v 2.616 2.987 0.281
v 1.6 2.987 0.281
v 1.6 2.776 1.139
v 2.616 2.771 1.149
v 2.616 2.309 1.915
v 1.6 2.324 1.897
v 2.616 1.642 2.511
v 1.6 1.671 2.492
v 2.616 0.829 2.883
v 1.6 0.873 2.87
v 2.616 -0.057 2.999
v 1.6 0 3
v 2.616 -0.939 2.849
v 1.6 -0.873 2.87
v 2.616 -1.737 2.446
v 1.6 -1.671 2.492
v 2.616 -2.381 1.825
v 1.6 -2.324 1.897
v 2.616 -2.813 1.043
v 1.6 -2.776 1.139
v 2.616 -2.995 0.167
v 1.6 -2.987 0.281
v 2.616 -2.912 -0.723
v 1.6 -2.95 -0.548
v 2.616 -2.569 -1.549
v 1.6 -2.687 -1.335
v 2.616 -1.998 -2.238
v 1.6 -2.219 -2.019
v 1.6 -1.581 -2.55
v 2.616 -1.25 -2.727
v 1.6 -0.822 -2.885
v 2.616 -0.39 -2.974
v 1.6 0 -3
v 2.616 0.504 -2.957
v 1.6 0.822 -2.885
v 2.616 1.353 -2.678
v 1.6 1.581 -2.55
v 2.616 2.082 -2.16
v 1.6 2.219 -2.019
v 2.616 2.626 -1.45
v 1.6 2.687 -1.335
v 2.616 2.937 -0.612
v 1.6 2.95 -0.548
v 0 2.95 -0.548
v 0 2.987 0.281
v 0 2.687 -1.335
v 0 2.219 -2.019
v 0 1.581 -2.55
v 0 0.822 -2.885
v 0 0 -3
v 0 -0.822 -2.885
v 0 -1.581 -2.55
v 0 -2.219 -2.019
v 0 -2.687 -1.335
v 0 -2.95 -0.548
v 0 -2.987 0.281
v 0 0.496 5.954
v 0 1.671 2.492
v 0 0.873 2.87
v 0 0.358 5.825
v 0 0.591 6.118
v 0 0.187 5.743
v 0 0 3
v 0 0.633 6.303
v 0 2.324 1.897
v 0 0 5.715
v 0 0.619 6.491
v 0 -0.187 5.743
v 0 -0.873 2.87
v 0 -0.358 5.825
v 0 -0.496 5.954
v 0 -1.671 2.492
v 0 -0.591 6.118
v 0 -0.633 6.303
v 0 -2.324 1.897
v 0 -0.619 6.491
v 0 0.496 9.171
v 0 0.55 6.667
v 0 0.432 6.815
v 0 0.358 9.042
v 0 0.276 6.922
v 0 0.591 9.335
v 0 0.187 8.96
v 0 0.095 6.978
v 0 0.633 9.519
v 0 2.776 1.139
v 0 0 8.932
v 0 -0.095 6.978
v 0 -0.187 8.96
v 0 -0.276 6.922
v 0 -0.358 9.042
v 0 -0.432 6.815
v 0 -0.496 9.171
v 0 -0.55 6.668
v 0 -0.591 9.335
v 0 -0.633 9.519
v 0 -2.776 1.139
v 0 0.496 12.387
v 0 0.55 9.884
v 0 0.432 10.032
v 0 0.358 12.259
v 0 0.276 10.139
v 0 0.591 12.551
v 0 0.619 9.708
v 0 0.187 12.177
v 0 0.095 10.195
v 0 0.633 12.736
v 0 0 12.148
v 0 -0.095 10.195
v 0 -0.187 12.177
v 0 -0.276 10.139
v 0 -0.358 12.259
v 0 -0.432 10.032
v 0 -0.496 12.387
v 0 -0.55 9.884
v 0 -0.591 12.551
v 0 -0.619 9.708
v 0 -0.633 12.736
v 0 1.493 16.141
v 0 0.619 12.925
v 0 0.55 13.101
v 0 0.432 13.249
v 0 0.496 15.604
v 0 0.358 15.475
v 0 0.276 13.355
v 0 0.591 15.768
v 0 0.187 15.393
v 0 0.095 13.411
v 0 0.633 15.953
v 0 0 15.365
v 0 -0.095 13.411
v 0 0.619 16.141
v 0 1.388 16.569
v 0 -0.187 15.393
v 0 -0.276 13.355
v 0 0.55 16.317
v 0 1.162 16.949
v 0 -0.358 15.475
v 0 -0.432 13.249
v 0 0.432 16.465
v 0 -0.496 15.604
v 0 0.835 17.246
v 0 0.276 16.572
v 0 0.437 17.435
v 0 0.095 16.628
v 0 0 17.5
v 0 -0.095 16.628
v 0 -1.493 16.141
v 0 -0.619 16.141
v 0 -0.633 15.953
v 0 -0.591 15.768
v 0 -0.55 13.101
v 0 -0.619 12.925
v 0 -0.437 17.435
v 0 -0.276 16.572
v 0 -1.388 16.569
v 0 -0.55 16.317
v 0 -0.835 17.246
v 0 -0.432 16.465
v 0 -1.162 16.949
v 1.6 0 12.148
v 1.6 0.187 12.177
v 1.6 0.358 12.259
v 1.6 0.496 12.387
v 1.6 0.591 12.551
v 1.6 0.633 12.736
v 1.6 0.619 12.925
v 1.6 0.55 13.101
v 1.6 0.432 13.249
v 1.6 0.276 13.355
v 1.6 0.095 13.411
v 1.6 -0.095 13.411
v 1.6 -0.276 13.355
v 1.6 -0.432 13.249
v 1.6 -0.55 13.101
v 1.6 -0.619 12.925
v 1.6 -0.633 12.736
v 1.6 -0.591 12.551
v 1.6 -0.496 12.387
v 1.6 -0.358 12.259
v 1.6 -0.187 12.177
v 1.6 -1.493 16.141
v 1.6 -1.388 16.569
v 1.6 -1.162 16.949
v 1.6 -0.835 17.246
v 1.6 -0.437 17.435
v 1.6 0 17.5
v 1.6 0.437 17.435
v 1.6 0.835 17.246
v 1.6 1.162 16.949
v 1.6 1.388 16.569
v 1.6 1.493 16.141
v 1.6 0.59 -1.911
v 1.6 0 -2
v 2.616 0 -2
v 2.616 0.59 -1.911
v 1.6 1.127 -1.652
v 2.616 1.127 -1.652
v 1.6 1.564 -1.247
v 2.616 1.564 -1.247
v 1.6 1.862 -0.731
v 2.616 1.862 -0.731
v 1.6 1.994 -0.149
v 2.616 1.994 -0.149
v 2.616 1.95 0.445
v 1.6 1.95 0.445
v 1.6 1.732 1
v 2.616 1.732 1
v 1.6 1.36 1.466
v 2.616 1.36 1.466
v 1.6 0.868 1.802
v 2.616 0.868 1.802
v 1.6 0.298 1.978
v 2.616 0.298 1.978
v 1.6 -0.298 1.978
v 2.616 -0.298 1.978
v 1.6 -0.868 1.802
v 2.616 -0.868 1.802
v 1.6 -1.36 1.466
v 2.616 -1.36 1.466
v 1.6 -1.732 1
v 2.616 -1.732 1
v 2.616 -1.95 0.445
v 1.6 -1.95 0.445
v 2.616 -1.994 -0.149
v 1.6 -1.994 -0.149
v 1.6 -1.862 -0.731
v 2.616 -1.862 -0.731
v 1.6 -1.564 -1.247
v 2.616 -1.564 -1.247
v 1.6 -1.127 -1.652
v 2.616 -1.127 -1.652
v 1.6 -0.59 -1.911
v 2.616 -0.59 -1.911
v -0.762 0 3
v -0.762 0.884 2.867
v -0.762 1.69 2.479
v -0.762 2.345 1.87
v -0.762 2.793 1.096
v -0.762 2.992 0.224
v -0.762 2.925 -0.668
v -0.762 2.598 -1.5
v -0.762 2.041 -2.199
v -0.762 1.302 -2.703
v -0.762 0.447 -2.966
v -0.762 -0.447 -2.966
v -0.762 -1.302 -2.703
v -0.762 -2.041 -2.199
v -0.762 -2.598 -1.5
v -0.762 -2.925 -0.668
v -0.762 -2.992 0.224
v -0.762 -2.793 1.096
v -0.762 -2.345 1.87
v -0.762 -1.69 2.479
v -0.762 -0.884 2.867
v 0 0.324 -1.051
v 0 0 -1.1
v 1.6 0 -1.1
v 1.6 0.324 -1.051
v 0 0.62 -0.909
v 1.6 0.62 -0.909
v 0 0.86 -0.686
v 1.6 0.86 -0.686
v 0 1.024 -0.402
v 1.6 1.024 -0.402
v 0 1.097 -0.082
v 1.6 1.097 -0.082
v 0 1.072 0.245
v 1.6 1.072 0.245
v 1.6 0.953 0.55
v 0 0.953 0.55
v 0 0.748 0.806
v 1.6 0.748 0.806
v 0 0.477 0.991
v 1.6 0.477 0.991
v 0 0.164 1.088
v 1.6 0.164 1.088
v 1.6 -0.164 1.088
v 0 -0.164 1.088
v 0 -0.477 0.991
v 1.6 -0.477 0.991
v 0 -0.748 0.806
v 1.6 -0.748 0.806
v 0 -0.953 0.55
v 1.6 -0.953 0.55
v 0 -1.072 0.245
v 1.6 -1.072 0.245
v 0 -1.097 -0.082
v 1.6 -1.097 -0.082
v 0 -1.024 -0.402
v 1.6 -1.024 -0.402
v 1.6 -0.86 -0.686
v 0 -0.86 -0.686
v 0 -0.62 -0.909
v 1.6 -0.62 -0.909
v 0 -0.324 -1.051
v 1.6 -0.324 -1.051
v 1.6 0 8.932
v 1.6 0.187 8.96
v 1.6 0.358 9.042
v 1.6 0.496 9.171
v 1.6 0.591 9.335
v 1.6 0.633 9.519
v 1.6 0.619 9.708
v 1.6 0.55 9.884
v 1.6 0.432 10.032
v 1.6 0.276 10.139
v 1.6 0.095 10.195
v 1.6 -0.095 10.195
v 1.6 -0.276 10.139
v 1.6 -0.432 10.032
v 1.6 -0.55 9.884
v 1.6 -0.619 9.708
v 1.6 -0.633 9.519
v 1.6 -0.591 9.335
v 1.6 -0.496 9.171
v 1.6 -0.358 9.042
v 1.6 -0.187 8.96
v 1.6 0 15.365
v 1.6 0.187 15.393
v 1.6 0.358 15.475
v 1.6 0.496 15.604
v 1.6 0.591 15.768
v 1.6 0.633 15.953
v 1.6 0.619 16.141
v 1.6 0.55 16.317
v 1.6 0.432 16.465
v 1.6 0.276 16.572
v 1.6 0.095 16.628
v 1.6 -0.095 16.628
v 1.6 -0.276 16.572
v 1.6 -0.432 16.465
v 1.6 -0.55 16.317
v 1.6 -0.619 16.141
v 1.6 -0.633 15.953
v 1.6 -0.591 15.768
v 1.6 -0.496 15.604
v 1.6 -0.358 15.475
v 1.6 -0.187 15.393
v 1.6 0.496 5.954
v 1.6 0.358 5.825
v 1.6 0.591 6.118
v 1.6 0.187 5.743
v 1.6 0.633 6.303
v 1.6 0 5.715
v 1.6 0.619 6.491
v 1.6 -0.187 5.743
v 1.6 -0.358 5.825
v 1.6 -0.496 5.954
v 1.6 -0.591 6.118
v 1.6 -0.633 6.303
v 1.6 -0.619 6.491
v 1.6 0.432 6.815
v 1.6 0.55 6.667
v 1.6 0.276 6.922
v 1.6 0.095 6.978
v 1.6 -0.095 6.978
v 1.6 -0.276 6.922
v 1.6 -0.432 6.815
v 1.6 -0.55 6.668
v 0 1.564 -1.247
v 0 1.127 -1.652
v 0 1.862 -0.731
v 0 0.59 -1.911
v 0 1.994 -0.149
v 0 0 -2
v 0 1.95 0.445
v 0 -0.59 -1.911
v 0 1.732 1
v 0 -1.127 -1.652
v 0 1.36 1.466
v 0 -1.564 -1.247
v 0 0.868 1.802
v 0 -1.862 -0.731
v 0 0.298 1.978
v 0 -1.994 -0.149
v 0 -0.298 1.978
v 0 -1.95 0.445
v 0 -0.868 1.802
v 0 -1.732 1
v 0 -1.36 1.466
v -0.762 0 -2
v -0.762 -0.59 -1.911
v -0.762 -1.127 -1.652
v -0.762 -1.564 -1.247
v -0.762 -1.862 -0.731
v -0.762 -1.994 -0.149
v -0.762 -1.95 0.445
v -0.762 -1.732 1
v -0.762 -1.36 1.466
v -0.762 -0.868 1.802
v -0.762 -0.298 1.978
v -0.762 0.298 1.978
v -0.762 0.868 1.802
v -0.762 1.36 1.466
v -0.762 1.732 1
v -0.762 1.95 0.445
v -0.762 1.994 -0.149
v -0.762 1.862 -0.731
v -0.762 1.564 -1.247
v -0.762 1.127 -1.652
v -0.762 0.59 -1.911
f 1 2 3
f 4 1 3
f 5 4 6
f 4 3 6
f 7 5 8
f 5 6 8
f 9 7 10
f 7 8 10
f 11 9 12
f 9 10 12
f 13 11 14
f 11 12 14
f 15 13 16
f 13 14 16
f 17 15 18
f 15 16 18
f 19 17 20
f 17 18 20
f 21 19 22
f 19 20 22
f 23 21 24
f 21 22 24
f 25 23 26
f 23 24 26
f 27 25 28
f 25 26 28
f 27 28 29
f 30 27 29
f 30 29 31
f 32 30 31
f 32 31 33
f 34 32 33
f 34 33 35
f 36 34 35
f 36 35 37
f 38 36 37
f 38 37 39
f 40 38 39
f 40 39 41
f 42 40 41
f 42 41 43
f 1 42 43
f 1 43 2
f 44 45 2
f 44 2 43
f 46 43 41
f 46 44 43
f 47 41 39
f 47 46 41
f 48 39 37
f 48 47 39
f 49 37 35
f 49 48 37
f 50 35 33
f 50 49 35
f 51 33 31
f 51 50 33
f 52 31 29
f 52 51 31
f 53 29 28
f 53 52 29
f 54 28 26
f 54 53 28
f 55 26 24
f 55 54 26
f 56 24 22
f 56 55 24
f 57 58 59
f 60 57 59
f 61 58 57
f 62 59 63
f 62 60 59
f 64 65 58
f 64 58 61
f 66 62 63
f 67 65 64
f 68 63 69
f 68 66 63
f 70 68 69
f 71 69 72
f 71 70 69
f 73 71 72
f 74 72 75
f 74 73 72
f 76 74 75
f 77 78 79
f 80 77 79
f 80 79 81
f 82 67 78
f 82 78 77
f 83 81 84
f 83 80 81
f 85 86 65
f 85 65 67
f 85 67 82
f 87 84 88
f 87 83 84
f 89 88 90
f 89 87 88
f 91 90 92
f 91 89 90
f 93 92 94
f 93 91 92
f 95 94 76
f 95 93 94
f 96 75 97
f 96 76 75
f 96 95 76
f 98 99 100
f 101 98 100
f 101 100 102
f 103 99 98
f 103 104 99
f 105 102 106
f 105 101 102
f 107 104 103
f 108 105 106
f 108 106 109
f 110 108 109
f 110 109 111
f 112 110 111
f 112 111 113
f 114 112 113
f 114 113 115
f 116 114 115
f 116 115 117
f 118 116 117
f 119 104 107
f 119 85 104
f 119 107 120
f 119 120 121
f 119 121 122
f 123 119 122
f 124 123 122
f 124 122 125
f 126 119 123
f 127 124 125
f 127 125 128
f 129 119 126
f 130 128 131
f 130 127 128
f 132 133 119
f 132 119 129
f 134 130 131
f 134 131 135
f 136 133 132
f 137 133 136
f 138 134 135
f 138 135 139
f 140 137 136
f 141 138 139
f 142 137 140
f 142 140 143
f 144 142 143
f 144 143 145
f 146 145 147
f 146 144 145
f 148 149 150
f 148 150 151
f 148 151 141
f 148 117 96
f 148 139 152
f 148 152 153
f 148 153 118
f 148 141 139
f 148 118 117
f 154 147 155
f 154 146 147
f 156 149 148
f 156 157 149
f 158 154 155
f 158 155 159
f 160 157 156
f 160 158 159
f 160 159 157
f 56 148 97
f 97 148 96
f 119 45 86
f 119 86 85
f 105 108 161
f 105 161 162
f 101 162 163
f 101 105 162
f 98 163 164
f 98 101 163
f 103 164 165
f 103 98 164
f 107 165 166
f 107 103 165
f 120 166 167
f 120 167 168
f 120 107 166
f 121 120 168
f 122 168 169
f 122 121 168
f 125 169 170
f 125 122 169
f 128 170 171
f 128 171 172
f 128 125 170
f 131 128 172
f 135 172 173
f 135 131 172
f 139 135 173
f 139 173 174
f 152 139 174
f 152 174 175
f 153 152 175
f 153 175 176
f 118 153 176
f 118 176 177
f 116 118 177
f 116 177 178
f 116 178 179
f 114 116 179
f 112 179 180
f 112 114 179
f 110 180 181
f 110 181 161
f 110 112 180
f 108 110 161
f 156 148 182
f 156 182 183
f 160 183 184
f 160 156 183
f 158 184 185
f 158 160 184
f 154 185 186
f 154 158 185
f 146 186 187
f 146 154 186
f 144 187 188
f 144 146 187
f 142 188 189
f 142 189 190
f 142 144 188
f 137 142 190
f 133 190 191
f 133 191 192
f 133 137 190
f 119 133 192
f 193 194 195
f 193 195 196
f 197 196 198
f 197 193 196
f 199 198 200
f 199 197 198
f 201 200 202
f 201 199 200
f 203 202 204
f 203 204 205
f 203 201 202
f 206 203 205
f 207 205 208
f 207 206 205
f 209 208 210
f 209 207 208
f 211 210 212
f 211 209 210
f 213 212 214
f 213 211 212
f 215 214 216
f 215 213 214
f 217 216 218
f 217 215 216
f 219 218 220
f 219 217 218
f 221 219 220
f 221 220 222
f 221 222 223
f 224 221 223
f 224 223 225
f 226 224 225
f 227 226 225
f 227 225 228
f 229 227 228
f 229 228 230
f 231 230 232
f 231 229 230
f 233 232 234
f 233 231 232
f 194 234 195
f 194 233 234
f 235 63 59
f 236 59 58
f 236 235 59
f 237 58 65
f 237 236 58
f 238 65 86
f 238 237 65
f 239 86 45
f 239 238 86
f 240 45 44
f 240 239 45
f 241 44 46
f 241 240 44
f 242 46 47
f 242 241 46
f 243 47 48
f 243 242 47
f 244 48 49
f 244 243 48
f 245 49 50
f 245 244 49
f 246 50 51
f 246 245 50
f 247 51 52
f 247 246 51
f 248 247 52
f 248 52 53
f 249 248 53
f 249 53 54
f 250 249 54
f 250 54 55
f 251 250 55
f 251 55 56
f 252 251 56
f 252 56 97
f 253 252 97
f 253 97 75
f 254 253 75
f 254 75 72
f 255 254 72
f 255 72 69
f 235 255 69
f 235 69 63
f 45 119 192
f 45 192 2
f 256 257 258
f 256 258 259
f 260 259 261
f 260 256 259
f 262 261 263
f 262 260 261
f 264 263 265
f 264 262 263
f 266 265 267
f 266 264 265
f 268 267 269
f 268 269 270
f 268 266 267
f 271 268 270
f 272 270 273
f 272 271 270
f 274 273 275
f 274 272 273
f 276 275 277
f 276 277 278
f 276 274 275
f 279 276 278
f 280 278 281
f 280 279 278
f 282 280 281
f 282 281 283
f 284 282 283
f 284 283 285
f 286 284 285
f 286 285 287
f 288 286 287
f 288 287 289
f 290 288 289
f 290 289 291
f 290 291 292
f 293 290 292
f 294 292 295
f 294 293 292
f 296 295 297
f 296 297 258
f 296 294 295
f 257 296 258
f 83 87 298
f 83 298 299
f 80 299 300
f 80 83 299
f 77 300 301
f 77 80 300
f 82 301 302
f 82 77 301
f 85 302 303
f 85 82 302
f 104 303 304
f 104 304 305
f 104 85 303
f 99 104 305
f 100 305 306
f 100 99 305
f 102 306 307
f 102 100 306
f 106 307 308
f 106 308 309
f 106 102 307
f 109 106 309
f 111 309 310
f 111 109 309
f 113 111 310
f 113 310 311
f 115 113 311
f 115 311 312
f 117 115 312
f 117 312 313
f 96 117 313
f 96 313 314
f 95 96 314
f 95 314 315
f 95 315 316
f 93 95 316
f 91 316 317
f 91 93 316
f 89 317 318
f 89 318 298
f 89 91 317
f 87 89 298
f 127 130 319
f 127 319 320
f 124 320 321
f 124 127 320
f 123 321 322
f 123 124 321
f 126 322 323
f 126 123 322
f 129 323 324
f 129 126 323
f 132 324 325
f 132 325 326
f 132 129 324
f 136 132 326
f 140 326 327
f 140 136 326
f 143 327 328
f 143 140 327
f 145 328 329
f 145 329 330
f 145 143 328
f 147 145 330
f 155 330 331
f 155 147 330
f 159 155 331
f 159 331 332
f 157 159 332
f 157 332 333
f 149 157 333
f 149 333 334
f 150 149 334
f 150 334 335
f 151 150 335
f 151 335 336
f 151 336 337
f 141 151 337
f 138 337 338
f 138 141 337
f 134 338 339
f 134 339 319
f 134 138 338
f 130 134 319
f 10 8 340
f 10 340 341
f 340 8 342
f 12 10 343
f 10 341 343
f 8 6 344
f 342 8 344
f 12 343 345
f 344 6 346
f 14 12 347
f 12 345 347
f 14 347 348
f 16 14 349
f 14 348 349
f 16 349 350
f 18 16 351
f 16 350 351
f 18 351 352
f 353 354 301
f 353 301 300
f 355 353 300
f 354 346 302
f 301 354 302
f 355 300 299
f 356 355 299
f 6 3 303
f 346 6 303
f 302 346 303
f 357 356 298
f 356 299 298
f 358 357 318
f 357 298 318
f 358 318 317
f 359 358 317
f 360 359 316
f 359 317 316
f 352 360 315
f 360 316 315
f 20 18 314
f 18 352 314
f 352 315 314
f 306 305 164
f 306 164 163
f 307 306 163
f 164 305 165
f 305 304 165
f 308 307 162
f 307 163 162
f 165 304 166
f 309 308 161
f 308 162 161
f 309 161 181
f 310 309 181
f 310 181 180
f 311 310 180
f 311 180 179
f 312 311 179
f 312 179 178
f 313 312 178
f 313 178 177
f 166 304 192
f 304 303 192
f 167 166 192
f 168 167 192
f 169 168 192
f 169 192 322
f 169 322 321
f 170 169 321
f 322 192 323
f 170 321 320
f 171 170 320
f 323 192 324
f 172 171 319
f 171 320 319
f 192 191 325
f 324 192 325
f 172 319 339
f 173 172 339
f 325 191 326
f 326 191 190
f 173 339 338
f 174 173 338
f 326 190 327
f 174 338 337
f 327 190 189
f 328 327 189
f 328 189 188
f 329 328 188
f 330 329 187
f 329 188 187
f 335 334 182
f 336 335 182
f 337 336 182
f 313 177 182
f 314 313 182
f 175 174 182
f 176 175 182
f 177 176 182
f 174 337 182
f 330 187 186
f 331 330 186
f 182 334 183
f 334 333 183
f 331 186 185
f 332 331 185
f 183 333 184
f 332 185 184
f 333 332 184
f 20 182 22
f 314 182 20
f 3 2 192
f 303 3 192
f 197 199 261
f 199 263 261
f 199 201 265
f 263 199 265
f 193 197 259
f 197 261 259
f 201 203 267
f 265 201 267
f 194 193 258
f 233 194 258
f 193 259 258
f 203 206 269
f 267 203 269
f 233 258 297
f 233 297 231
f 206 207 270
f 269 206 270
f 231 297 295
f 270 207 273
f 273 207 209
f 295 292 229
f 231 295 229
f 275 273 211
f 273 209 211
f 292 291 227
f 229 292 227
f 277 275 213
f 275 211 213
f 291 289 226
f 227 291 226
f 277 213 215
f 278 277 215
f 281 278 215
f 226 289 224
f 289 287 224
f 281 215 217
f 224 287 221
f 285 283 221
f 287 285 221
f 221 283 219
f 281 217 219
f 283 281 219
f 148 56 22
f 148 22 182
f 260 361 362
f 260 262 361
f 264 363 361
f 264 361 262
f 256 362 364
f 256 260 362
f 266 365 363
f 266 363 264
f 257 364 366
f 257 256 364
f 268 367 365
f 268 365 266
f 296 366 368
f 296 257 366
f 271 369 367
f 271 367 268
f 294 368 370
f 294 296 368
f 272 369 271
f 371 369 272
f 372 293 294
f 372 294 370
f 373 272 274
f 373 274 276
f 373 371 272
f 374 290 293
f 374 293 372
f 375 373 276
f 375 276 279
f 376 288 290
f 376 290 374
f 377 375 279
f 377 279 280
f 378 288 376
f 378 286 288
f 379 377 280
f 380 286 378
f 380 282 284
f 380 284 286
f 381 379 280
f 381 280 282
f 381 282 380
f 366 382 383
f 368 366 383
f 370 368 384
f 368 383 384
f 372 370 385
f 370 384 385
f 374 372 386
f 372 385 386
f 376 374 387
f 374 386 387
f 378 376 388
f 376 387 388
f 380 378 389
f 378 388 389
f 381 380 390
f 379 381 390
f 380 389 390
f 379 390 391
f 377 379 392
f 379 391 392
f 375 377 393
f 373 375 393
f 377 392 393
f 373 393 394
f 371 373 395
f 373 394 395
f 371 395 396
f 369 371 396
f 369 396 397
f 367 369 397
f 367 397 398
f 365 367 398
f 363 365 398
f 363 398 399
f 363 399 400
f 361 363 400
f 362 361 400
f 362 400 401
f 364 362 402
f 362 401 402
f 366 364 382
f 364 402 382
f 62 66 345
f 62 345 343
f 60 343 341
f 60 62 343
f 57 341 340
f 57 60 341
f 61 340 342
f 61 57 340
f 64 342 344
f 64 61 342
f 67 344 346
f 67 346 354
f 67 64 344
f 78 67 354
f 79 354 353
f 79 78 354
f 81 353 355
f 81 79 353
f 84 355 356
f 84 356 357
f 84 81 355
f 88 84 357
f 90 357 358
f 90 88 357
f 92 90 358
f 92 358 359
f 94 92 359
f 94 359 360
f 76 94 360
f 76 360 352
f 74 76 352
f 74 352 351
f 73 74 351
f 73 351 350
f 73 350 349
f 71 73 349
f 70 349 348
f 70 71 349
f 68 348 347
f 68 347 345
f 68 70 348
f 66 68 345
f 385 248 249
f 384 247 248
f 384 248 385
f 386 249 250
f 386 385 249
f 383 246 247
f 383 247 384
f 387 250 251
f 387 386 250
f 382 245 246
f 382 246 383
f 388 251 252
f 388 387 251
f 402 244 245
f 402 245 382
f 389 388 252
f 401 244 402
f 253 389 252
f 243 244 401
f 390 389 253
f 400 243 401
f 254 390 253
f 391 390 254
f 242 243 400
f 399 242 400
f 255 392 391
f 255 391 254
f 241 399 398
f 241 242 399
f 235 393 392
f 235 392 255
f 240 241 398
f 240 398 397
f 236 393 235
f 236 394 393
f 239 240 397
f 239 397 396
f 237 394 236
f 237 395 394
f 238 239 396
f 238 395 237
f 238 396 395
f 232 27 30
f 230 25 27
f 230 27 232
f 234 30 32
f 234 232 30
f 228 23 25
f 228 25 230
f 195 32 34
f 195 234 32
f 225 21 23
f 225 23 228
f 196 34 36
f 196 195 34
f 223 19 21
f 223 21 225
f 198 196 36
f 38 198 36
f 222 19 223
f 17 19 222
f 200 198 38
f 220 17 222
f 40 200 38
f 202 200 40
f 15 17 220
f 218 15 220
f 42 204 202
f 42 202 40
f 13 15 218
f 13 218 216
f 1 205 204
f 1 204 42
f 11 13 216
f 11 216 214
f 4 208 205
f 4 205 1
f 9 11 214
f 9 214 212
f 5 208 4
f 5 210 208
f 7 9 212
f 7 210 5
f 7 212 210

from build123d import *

# Parameters (mm, degrees)
SKETCH1_R           = 1.1
SKETCH1_R_2         = 0.635
BOSS_EXTRUDE1_DEPTH = 1.6
SKETCH2_R           = 3
SKETCH2_R_2         = 2
BOSS_EXTRUDE2_DEPTH = 1.016
BOSS_EXTRUDE3_START = 0.762
SKETCH3_R           = 3
SKETCH3_R_2         = 2
BOSS_EXTRUDE3_DEPTH = 0.762


with BuildPart() as part:
    # Sketch1 → Boss-Extrude1 (new body)
    with BuildSketch(Plane.YZ):
        with BuildLine():
            Line((-2.98678731, 0.28125), (-1.493393655, 16.140625))
            ThreePointArc((-1.493393655, 16.140625), (0, 17.5), (1.493393655, 16.140625))
            Line((1.493393655, 16.140625), (2.98678731, 0.28125))
            ThreePointArc((2.98678731, 0.28125), (0, -3), (-2.98678731, 0.28125))
        make_face()
        with Locations(Location((0, 0, 0), (0, 0, 270))):
            Circle(SKETCH1_R, mode=Mode.SUBTRACT)
        with Locations(Location((0, 16, 0), (0, 0, 270))):
            Circle(SKETCH1_R_2, mode=Mode.SUBTRACT)
        with Locations(Location((0, 12.783333333, 0), (0, 0, 270))):
            Circle(SKETCH1_R_2, mode=Mode.SUBTRACT)
        with Locations(Location((0, 9.566666667, 0), (0, 0, 270))):
            Circle(SKETCH1_R_2, mode=Mode.SUBTRACT)
        with Locations(Location((0, 6.35, 0), (0, 0, 270))):
            Circle(SKETCH1_R_2, mode=Mode.SUBTRACT)
    extrude(amount=BOSS_EXTRUDE1_DEPTH)

    # Sketch2 → Boss-Extrude2 (add)
    with BuildSketch(Plane.YZ.offset(1.6)):
        with Locations(Location((0, 0, 0), (0, 0, 5.379378991))):
            Circle(SKETCH2_R)
        with Locations(Location((0, 0, 0), (0, 0, 270))):
            Circle(SKETCH2_R_2, mode=Mode.SUBTRACT)
    extrude(amount=BOSS_EXTRUDE2_DEPTH)

    # Sketch3 → Boss-Extrude3 (add)
    with BuildSketch(Plane(origin=(0, 0, 0), x_dir=(0, -1, 0), z_dir=(-1, 0, 0)).offset(BOSS_EXTRUDE3_START)):
        with Locations(Location((0, 0, 0), (0, 0, 90))):
            Circle(SKETCH3_R)
        with Locations(Location((0, 0, 0), (0, 0, 270))):
            Circle(SKETCH3_R_2, mode=Mode.SUBTRACT)
    extrude(amount=-BOSS_EXTRUDE3_DEPTH)


solid = part.part
